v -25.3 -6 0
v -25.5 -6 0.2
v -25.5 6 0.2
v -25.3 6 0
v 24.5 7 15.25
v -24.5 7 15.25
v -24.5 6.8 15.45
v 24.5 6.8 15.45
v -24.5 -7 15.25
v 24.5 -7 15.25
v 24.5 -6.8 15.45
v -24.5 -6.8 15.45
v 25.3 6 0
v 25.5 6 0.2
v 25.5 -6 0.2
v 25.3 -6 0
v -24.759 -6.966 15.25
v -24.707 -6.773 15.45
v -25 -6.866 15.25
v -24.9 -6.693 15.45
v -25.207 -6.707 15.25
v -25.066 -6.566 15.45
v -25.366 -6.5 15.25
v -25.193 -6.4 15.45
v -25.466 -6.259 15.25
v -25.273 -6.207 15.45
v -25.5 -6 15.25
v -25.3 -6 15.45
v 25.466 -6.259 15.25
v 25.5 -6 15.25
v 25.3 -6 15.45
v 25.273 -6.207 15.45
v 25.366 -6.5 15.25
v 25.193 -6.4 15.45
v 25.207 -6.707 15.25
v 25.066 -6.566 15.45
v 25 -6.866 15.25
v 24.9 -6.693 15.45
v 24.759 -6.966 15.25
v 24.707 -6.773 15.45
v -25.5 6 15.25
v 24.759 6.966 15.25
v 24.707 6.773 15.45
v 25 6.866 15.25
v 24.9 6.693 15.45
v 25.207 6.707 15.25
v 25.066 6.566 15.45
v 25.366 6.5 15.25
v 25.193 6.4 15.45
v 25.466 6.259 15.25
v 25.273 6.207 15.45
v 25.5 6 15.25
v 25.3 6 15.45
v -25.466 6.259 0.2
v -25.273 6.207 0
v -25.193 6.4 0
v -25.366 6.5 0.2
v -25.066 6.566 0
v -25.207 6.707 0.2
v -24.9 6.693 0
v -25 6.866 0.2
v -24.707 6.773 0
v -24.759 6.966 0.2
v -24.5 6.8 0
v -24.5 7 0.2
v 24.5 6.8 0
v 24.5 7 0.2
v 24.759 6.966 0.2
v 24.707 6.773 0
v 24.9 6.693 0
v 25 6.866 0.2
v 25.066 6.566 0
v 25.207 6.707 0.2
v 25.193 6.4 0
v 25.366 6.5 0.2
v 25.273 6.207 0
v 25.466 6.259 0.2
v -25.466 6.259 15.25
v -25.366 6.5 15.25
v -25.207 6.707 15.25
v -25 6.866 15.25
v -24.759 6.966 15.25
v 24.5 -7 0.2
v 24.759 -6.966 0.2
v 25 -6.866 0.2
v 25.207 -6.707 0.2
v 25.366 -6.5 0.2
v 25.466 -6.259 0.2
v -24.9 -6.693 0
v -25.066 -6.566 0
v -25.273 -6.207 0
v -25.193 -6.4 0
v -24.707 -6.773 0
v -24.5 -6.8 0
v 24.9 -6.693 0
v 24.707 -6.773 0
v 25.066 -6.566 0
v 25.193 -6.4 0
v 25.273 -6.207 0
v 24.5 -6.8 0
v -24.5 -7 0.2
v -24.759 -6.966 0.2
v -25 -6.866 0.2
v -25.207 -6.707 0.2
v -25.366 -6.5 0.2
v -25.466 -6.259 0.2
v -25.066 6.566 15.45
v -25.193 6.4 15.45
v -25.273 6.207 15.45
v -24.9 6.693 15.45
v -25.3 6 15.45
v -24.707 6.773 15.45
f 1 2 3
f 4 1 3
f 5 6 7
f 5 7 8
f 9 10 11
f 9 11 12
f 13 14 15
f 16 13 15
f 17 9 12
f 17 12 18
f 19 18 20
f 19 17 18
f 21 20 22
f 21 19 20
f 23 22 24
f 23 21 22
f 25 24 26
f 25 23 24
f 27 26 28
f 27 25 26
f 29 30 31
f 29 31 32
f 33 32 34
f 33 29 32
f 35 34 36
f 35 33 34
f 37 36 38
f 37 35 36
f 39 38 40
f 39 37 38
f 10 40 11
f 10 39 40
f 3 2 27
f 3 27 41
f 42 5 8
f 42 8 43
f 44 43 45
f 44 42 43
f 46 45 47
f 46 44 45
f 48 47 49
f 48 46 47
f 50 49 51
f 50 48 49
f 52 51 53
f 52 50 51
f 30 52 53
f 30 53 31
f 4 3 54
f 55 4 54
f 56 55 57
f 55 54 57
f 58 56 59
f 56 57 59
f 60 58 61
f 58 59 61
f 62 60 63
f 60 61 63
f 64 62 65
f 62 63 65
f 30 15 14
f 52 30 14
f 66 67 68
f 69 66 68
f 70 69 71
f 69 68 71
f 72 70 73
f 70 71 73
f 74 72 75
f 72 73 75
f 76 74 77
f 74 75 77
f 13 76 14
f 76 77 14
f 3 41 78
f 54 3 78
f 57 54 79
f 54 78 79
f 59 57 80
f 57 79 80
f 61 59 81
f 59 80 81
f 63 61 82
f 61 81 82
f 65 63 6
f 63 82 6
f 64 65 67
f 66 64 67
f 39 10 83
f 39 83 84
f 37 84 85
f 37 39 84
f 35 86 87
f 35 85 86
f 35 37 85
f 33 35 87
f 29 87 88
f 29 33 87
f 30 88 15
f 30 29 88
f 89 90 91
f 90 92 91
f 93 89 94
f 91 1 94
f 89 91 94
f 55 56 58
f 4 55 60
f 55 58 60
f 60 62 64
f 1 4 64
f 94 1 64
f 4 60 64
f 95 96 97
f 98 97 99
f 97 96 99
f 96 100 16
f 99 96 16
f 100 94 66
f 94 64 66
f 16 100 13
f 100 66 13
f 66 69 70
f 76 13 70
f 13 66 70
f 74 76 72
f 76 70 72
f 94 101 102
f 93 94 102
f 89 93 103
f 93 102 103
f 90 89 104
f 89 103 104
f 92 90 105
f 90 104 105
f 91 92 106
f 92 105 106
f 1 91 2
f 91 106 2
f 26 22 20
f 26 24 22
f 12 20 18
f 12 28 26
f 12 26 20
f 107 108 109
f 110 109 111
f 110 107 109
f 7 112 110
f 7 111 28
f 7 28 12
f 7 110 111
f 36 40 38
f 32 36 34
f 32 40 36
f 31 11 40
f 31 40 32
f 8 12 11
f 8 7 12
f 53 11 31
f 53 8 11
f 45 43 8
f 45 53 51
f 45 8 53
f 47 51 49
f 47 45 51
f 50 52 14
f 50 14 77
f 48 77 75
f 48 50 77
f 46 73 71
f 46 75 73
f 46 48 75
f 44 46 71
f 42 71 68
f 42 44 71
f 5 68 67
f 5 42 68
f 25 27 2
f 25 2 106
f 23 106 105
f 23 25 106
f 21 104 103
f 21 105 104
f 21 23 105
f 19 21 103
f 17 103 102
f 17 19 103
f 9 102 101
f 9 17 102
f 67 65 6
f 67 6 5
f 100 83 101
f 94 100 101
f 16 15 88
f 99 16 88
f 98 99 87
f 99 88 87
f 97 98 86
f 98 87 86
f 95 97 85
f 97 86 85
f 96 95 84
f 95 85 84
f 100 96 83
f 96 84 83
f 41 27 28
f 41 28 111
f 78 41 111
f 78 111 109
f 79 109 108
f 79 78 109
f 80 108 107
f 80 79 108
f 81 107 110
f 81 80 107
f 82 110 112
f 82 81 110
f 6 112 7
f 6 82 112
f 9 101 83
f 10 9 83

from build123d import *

# Parameters (mm, degrees)
F0_W     = 51
F0_H     = 14
F1_DEPTH = 15.45
F2_R     = 1
F3_SIZE  = 0.2


with BuildPart() as f1:
    # F0 (on Top) → F1 (new body)
    with BuildSketch(Plane.XY):
        Rectangle(F0_W, F0_H)
    extrude(amount=F1_DEPTH)

    # F2
    f2_edges = [f1.edges().sort_by_distance(p)[0] for p in [
        (-25.5, -7, 7.725),
        (25.5, -7, 7.725),
        (-25.5, 7, 7.725),
        (25.5, 7, 7.725),
    ]]
    fillet(f2_edges, radius=F2_R)

    # F3
    f3_edges = [f1.edges().sort_by_distance(p)[0] for p in [
        (0, 7, 15.45),
        (25.207107, 6.707107, 15.45),
        (-25.207107, 6.707107, 15.45),
        (25.5, 0, 15.45),
        (-25.5, 0, 15.45),
        (25.207107, -6.707107, 15.45),
        (-25.207107, -6.707107, 15.45),
        (0, -7, 15.45),
        (0, 7, 0),
        (25.207107, 6.707107, 0),
        (-25.207107, 6.707107, 0),
        (25.5, 0, 0),
        (-25.5, 0, 0),
        (25.207107, -6.707107, 0),
        (-25.207107, -6.707107, 0),
        (0, -7, 0),
    ]]
    chamfer(f3_edges, length=F3_SIZE)


solid = f1.part
